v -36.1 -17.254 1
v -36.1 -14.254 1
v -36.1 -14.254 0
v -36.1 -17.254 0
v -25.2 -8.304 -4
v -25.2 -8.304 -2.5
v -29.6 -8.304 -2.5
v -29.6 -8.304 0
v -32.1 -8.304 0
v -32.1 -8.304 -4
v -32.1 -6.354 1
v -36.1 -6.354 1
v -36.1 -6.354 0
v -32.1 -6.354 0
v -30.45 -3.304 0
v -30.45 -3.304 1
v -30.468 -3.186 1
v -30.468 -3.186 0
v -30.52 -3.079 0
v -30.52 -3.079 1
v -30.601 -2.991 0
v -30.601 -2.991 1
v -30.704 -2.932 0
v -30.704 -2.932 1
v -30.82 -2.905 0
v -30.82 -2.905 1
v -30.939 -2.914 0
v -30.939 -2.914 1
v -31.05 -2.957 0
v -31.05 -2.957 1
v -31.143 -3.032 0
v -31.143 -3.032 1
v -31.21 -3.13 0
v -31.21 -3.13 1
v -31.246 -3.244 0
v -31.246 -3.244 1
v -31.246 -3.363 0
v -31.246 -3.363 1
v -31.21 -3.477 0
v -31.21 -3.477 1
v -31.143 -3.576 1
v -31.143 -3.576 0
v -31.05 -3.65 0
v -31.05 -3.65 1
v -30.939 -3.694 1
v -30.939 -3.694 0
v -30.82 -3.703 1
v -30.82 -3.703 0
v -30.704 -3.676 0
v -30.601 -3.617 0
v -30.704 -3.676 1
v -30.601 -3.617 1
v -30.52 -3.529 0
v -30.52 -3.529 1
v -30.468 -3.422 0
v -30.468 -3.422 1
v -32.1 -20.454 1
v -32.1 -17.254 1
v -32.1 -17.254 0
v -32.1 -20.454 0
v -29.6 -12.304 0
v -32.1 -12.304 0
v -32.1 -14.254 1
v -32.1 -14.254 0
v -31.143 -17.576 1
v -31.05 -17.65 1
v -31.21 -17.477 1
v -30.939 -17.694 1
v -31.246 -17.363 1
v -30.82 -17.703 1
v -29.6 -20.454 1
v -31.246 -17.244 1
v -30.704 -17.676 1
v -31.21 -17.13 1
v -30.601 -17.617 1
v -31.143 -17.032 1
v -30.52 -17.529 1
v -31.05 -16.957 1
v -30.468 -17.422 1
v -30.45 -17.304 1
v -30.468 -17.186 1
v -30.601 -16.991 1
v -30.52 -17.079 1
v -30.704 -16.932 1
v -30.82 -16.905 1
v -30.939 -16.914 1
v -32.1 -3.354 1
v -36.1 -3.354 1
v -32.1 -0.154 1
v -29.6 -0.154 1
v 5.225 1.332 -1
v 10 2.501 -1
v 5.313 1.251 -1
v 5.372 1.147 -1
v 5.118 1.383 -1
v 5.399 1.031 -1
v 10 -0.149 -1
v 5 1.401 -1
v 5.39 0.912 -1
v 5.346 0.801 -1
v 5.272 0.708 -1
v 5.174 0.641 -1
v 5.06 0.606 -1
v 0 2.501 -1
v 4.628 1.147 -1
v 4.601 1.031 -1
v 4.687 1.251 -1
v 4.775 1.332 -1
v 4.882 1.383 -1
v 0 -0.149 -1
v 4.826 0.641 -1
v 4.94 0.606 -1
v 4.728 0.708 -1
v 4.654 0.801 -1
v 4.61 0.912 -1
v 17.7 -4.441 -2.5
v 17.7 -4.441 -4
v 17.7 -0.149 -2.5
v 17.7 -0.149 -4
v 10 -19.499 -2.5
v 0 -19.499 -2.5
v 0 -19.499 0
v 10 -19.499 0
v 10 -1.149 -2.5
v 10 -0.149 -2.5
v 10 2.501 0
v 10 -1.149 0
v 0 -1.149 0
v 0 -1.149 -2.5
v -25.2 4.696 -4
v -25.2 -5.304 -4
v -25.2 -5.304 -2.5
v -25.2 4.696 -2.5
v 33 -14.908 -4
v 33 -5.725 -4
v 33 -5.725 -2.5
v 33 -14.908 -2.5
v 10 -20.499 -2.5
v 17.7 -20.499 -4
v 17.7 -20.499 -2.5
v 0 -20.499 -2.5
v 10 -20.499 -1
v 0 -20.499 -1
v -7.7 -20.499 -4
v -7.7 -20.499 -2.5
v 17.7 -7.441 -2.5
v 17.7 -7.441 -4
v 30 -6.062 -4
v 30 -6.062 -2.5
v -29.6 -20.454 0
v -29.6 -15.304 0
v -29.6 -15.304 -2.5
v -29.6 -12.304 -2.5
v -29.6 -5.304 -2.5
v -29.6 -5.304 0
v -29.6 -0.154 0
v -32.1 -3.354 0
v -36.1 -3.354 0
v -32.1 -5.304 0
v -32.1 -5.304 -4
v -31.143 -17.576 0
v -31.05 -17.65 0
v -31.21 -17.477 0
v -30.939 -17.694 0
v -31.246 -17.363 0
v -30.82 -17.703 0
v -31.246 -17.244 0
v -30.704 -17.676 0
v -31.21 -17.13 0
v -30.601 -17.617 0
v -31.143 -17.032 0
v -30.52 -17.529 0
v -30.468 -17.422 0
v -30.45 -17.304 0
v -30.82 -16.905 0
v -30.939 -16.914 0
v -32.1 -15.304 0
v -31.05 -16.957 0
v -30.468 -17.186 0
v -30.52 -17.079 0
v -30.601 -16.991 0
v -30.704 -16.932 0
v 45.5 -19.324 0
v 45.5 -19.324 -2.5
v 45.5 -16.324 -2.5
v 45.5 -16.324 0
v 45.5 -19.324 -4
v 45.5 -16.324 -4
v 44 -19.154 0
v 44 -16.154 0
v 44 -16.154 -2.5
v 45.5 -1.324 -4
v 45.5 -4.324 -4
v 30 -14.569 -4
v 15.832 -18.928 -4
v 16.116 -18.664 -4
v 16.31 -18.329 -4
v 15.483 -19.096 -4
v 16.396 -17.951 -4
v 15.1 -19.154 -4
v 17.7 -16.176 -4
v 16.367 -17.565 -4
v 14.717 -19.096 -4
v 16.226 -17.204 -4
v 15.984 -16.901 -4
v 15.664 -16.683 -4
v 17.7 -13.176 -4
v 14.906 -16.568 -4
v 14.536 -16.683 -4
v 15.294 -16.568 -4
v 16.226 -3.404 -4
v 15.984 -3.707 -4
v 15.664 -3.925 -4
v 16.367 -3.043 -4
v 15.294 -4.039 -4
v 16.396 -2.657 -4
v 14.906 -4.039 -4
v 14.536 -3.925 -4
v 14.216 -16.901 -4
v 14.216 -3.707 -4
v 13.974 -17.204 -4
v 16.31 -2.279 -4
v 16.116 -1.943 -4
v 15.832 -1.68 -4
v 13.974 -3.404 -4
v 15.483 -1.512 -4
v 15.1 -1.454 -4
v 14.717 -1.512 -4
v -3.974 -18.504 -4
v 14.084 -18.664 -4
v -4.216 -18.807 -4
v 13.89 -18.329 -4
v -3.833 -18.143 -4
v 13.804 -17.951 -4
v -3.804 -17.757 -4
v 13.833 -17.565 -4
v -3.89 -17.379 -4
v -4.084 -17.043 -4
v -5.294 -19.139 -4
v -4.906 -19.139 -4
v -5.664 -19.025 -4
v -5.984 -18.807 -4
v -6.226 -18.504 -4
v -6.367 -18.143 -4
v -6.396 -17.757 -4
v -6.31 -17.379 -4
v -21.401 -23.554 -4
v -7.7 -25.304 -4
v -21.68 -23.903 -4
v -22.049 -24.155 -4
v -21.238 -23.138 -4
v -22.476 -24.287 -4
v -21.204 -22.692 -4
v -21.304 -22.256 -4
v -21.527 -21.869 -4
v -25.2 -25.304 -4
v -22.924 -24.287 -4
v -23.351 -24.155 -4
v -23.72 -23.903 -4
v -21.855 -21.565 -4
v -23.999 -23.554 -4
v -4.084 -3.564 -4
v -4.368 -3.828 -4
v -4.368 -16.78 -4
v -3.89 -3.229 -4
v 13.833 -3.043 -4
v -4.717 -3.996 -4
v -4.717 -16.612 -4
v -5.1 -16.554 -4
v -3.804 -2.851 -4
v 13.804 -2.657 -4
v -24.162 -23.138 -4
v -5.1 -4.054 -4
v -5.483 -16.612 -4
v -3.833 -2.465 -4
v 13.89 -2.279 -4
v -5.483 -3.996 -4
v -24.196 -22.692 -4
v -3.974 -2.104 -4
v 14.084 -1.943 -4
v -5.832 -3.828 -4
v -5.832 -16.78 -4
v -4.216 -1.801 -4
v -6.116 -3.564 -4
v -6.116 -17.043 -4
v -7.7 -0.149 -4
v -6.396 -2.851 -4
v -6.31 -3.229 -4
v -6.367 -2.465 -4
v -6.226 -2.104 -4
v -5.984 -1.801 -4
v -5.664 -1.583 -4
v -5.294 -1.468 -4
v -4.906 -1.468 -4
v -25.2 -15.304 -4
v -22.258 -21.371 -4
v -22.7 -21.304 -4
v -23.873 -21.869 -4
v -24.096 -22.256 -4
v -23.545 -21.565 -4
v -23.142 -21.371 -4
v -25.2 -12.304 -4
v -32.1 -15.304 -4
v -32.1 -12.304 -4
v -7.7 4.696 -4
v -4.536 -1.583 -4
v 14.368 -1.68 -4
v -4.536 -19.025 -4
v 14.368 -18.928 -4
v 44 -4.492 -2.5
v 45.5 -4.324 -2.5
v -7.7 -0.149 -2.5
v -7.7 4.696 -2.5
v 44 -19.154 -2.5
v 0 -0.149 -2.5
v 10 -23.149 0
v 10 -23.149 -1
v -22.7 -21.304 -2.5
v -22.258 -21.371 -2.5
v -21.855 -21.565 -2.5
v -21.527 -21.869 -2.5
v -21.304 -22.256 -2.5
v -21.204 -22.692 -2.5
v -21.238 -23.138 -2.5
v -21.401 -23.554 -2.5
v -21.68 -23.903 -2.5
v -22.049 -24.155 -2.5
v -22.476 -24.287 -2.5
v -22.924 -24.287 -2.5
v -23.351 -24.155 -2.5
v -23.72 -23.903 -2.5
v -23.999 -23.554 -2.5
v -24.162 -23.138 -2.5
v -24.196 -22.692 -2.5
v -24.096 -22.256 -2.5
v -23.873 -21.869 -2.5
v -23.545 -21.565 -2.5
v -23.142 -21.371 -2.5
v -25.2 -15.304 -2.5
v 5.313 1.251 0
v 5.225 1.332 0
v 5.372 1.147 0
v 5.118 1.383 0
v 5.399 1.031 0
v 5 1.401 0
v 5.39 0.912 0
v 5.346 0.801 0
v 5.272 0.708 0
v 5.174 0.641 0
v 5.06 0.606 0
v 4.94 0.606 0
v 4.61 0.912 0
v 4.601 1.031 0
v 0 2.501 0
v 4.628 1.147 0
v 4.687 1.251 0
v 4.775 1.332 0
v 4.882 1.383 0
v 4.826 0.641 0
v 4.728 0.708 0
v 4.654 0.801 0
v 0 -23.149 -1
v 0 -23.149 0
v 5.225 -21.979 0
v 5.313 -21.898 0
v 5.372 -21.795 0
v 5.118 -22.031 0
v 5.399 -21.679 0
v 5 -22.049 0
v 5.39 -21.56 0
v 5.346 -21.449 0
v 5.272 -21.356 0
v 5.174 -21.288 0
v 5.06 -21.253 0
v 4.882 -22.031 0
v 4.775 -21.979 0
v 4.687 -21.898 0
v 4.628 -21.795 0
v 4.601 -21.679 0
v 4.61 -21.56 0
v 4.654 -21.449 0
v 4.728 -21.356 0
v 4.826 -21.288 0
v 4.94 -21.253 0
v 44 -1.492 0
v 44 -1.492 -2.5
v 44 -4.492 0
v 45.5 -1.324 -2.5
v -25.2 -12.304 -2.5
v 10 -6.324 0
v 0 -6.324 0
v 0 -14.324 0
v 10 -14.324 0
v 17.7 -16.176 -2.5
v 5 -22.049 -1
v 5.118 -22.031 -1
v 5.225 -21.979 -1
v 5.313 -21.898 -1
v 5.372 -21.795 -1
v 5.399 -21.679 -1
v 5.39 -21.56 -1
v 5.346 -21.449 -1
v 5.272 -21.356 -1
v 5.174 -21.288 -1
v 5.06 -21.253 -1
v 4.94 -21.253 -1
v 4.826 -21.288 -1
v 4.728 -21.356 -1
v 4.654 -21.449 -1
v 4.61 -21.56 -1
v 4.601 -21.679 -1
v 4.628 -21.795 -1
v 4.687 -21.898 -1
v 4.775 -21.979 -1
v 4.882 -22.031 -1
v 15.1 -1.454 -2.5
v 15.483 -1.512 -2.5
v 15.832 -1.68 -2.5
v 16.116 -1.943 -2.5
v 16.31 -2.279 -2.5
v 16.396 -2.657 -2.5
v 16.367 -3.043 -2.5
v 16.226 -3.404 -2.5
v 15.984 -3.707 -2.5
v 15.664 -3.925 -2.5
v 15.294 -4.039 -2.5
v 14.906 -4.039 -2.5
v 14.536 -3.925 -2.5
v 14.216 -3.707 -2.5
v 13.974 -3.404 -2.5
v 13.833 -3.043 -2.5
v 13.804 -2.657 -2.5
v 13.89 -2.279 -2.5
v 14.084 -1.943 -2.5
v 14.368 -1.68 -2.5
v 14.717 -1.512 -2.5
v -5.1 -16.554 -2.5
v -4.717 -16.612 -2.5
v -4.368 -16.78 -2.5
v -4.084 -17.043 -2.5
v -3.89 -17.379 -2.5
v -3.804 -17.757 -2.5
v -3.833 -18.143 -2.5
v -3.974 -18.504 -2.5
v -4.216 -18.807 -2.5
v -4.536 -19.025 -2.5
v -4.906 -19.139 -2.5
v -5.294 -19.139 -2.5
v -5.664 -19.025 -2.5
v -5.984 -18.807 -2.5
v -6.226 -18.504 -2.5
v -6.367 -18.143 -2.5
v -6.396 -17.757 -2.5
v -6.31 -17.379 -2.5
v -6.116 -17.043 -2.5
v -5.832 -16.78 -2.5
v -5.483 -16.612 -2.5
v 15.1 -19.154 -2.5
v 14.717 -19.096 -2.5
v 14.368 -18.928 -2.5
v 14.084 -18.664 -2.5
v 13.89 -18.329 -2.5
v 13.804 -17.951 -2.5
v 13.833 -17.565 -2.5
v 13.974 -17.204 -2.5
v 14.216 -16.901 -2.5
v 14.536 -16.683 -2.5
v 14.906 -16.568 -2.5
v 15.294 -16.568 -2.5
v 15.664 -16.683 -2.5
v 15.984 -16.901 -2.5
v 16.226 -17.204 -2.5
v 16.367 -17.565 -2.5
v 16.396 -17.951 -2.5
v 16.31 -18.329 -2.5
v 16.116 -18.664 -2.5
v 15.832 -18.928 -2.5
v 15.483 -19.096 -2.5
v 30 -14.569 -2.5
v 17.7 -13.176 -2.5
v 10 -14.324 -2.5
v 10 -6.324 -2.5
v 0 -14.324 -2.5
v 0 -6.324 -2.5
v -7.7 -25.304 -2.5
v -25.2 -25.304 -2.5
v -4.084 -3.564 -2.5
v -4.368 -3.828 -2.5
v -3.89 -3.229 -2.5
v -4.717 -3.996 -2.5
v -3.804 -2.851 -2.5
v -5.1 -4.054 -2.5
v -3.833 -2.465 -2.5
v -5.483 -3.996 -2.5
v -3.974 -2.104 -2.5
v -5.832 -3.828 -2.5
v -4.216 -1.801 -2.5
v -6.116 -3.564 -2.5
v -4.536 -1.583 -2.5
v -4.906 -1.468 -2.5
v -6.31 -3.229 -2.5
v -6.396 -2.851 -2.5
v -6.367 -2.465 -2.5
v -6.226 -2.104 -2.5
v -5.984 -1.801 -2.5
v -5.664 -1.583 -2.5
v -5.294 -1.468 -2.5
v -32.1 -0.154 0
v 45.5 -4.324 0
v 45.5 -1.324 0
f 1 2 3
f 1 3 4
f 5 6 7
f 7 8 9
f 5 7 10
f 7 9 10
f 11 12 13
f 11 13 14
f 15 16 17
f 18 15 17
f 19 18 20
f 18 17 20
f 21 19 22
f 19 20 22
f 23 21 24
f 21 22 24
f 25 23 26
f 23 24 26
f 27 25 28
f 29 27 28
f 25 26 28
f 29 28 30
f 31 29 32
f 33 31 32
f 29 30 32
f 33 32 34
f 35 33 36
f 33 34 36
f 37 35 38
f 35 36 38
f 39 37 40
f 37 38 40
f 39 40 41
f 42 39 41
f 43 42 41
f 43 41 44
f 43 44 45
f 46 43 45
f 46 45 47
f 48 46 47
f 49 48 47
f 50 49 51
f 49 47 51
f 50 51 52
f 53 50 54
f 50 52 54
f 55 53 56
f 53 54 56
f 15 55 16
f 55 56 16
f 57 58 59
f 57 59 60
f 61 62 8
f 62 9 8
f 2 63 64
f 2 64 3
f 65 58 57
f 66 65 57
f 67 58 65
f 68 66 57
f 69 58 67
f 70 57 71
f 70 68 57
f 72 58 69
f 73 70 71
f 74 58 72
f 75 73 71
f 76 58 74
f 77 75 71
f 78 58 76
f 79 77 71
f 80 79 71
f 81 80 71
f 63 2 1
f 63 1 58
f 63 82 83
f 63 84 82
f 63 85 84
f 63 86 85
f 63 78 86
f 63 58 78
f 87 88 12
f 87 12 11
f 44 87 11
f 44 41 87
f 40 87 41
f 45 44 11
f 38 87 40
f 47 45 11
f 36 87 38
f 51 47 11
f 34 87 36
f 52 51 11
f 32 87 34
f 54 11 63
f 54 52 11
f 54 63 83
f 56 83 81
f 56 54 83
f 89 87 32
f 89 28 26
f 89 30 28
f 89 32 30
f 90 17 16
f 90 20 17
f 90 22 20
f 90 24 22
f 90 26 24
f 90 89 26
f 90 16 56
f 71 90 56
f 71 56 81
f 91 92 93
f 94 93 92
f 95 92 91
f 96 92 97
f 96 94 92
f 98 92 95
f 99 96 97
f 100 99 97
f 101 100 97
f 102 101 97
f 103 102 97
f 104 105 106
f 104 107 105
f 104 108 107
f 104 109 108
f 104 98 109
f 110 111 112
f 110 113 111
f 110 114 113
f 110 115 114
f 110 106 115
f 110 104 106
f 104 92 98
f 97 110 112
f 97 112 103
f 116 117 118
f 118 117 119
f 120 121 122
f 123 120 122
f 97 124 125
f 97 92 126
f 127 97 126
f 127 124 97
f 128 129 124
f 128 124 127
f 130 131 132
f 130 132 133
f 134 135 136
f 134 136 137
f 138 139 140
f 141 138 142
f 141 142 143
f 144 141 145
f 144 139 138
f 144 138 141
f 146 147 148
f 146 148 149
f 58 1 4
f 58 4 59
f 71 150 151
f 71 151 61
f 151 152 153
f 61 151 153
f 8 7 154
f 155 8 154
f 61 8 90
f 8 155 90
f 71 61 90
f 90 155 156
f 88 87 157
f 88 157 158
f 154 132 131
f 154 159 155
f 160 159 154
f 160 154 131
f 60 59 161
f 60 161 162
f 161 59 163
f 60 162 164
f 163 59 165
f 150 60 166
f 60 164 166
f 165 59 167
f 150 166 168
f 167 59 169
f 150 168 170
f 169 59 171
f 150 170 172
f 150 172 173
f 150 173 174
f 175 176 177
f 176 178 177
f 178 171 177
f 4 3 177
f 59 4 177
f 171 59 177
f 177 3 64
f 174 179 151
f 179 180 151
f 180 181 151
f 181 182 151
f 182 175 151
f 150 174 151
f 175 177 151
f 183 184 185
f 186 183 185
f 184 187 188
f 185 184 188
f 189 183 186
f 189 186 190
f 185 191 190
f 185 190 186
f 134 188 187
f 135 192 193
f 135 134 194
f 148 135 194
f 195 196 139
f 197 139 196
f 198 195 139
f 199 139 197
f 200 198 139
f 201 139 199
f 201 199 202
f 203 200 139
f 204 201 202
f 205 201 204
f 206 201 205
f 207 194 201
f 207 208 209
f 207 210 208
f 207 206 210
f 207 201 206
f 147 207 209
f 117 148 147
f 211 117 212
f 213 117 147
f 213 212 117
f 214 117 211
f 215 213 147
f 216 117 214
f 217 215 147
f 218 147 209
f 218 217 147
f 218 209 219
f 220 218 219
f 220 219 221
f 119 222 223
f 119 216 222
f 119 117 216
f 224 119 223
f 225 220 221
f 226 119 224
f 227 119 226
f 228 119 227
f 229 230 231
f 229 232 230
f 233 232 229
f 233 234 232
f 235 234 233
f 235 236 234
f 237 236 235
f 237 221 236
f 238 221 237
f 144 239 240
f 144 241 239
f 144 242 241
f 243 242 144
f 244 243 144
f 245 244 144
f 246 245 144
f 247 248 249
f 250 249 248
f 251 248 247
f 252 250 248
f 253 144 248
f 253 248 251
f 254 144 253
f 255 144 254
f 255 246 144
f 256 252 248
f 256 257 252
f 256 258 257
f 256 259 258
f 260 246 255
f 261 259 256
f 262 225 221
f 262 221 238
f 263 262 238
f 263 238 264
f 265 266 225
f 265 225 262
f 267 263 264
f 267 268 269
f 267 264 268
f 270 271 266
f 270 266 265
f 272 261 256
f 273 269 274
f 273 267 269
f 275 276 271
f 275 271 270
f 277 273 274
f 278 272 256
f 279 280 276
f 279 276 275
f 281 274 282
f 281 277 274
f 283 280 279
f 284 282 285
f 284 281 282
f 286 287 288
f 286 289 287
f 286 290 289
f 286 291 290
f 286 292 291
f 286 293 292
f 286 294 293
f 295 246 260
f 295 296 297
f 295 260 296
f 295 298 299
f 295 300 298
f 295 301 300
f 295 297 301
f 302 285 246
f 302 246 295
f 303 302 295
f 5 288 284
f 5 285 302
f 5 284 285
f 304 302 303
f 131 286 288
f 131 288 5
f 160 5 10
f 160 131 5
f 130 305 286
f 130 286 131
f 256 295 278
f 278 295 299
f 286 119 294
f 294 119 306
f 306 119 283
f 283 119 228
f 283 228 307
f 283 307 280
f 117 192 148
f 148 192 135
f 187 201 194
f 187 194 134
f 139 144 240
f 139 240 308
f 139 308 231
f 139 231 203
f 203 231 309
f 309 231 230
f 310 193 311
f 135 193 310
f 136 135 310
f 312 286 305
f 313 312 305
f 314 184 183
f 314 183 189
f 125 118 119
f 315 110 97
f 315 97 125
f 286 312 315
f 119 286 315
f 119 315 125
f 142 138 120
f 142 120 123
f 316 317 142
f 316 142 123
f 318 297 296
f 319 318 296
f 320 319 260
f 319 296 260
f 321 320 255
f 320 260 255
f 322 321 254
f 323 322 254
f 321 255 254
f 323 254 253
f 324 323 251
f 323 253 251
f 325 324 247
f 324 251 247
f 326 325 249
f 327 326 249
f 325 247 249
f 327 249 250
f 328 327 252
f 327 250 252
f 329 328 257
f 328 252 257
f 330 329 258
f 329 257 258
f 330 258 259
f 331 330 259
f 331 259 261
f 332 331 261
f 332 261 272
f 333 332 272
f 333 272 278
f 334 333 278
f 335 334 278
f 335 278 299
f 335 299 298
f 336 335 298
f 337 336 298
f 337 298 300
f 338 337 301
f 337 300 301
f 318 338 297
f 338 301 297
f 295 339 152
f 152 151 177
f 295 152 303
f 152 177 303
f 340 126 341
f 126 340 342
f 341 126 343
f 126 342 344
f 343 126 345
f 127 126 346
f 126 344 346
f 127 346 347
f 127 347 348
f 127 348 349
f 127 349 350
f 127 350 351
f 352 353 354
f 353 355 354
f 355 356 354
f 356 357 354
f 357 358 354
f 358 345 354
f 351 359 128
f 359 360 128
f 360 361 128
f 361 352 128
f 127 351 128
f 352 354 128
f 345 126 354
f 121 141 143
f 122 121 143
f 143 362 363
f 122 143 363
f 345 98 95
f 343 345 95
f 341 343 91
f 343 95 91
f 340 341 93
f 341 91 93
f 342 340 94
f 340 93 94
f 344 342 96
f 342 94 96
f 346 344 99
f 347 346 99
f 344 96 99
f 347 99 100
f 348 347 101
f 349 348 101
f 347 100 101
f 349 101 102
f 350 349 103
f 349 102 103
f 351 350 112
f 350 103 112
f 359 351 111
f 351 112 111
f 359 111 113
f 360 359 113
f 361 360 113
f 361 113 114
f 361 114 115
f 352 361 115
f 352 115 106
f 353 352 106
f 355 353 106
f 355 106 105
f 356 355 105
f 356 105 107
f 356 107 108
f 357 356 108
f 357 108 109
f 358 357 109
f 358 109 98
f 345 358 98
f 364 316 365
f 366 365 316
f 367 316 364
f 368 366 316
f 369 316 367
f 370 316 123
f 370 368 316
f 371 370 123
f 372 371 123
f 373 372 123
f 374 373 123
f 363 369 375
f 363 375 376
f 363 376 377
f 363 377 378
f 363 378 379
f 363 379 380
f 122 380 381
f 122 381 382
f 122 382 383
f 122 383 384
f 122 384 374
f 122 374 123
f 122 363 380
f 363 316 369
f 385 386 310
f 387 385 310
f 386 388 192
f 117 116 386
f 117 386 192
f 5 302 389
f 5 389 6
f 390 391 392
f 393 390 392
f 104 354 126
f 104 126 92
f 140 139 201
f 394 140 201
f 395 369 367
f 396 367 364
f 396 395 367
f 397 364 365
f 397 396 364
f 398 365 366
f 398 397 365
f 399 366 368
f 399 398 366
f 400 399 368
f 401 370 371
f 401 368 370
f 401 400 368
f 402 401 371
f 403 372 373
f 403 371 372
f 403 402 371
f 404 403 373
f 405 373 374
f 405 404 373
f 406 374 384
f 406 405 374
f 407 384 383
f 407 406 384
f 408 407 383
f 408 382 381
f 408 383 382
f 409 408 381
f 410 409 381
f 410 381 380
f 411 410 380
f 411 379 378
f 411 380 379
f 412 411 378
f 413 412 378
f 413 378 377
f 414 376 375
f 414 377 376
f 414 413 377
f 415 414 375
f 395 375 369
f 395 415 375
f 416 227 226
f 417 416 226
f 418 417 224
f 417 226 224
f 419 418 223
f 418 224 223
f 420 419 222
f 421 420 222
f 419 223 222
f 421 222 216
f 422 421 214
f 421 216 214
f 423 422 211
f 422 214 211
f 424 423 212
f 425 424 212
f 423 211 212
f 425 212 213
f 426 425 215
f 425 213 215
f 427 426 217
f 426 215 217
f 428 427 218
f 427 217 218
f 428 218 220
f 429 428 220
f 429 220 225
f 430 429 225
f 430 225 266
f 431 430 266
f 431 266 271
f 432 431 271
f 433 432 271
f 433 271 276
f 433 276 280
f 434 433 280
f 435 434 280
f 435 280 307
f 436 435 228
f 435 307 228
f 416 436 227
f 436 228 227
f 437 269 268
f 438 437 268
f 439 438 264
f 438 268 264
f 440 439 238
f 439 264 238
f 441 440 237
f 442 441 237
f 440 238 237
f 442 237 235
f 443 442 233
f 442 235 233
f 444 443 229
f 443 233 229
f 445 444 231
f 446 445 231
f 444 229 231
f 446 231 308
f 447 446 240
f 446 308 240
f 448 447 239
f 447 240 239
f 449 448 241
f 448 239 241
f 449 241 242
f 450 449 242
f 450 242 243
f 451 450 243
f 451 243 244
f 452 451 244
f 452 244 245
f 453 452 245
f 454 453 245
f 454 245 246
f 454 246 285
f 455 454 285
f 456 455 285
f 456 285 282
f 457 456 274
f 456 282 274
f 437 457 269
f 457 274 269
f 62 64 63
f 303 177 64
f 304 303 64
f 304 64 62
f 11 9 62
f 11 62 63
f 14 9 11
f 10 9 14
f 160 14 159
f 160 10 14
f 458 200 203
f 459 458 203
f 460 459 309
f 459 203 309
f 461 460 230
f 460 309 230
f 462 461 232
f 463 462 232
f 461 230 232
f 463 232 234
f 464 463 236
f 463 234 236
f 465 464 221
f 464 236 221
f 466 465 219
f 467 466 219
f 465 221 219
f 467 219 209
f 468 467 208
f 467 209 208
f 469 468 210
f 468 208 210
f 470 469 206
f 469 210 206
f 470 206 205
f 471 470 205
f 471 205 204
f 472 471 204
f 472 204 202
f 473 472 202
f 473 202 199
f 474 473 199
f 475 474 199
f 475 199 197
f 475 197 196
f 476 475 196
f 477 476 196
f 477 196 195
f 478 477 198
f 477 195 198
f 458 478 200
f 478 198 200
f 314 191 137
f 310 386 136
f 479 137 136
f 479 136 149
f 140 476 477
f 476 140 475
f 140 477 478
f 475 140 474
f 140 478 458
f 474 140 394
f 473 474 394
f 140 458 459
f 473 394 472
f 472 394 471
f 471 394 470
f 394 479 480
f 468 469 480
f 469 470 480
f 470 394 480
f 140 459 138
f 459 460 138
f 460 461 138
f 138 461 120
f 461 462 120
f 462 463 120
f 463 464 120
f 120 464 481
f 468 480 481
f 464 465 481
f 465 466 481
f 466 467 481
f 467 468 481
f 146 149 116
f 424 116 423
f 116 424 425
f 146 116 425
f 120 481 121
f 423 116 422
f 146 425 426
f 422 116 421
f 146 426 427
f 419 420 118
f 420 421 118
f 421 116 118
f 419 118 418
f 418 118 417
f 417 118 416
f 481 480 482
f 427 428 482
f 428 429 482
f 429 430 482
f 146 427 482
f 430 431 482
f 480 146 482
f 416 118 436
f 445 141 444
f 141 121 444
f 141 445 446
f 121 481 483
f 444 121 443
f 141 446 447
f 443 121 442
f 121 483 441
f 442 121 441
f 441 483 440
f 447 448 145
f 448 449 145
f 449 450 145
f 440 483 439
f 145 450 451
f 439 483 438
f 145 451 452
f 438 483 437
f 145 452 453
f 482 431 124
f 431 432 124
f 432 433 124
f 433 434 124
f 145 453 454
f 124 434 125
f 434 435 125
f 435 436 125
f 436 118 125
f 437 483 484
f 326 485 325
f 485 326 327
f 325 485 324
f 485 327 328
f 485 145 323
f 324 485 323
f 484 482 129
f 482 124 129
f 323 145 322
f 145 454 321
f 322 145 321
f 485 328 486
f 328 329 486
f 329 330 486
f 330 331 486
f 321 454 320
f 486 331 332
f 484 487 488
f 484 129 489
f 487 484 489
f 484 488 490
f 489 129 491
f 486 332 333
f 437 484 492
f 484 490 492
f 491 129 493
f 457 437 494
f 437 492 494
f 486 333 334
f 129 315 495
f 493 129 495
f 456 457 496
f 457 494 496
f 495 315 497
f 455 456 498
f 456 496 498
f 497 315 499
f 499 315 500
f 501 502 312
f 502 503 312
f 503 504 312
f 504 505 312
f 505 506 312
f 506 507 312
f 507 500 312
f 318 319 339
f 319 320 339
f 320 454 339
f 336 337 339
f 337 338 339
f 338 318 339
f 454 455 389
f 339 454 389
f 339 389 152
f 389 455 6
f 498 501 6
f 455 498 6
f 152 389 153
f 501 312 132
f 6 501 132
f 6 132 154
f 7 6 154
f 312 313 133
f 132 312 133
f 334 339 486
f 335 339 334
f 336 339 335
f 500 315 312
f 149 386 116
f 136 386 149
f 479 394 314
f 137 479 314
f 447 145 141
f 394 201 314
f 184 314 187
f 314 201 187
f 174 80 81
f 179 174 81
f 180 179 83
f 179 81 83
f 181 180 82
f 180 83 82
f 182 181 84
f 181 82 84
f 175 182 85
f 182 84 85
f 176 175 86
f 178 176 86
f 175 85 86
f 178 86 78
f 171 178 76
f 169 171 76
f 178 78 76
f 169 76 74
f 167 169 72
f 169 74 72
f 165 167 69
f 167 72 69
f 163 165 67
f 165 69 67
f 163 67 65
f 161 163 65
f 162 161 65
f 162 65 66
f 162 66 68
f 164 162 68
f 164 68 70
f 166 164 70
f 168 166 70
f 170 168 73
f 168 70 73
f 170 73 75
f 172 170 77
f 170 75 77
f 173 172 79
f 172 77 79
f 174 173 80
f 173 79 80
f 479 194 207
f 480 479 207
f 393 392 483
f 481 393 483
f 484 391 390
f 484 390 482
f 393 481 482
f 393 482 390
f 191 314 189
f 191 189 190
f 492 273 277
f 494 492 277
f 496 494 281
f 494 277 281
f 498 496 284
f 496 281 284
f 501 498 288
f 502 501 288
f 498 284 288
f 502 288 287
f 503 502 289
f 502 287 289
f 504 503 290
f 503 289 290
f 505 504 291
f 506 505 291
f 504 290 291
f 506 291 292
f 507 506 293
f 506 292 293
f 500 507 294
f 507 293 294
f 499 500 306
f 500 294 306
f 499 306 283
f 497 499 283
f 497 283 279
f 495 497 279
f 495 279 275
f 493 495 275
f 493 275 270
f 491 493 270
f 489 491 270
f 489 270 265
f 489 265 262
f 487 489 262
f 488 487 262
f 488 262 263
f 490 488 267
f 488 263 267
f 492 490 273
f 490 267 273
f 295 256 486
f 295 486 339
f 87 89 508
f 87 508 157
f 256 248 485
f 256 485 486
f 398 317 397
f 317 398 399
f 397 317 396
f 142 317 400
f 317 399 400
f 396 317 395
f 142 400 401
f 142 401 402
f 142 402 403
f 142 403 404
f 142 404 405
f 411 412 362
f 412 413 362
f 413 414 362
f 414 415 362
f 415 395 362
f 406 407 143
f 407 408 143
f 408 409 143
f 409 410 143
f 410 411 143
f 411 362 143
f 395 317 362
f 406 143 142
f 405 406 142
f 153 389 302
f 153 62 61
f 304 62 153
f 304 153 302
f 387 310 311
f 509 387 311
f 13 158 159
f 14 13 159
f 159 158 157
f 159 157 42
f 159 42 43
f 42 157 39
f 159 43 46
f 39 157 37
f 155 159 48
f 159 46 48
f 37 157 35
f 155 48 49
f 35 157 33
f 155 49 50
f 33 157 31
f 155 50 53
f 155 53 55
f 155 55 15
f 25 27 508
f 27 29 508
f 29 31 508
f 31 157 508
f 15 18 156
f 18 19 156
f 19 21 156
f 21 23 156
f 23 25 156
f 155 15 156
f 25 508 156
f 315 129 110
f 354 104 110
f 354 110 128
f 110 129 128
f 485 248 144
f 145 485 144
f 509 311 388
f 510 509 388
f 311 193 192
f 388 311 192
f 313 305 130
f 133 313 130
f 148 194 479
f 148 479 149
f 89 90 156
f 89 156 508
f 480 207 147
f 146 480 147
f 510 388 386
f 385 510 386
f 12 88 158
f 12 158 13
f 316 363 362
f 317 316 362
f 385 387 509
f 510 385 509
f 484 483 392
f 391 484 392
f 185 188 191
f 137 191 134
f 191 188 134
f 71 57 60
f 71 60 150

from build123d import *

# Parameters (mm, degrees)
EXTRUDE_1_DEPTH     = 10
SKETCH_2_R          = 0.4
CUT_EXTRUDE_1_DEPTH = 15.682716688
SKETCH_3_R          = 0.4
EXTRUDE_2_DEPTH     = 1
EXTRUDE_3_REACH     = 45.175
SKETCH_4_W          = 2.5
SKETCH_4_H          = 3
EXTRUDE_4_REACH     = 48.044
SKETCH_5_W          = 1.5
SKETCH_5_H          = 3
LOFT_START          = -4
LOFT_2_DEPTH        = 1.5
EXTRUDE_7_DEPTH     = 4
EXTRUDE_8_DEPTH     = 1.5
SKETCH_13_W         = 25.4
SKETCH_13_H         = 20.35
SKETCH_13_R         = 1.3
EXTRUDE_9_DEPTH     = 1.5
SKETCH_14_W         = 17.5
SKETCH_14_H         = 30
SKETCH_14_R         = 1.5
EXTRUDE_10_DEPTH    = 1.5


# Read off the part's stored shape, not the designer's step: По сечениям2
with BuildPart() as part:
    # Эскиз1 → Бобышка-Вытянуть1 (new body)
    with BuildSketch(Plane(origin=(0, 0, 0), x_dir=(0, 0, -1), z_dir=(1, 0, 0))):
        Polygon((0, 0), (0, 2.50113593), (1, 2.50113593), (1, -0.14886407), (4, -0.14886407), (4, -10.32386407), (0, -10.32386407), (0, -6.32386407), (2.5, -6.32386407), (2.5, -1.14886407), (0, -1.14886407), align=None)
    extrude_1 = extrude(amount=EXTRUDE_1_DEPTH)

    # Эскиз2 → Вырез-Вытянуть1 (cut, through all)
    with BuildSketch(Plane(origin=(0, 0, -1), x_dir=(-1, 0, 0), z_dir=(0, 0, -1))):
        with Locations(Location((-5, 1.00113593, 0), (0, 0, 90))):
            Circle(SKETCH_2_R)
    cut_extrude_1 = extrude(amount=-CUT_EXTRUDE_1_DEPTH, mode=Mode.SUBTRACT)

    # Зеркальное отражение1: Бобышка-Вытянуть1, Вырез-Вытянуть1 across plane
    add(extrude_1.mirror(Plane(origin=(10, -10.32386407, -4), x_dir=(0, 0, 1), z_dir=(0, 1, 0))))
    add(cut_extrude_1.mirror(Plane(origin=(10, -10.32386407, -4), x_dir=(0, 0, 1), z_dir=(0, 1, 0))), mode=Mode.SUBTRACT)

    # Эскиз5 → Бобышка-Вытянуть4 (add, up to next)
    with BuildSketch(Plane(origin=(-29.6, 0, 0), x_dir=(0, 0, -1), z_dir=(1, 0, 0)), mode=Mode.PRIVATE) as extrude_4_sk1:
        with Locations((3.25, -6.80386407)):
            Rectangle(SKETCH_5_W, SKETCH_5_H)
    extrude_4_tool1 = extrude(extrude_4_sk1.sketch, amount=EXTRUDE_4_REACH, mode=Mode.PRIVATE) - part.part
    # Эскиз5 → Бобышка-Вытянуть4 (add, up to next)
    with BuildSketch(Plane(origin=(-29.6, 0, 0), x_dir=(0, 0, -1), z_dir=(1, 0, 0)), mode=Mode.PRIVATE) as extrude_4_sk2:
        with Locations((3.25, -13.80386407)):
            Rectangle(SKETCH_5_W, SKETCH_5_H)
    extrude_4_tool2 = extrude(extrude_4_sk2.sketch, amount=EXTRUDE_4_REACH, mode=Mode.PRIVATE) - part.part


with BuildPart() as body_2:
    # Эскиз3 → Бобышка-Вытянуть2 (new body)
    with BuildSketch(Plane.XY.offset(1)):
        Polygon((-32.1, -0.15386407), (-32.1, -3.35386407), (-36.1, -3.35386407), (-36.1, -6.35386407), (-32.1, -6.35386407), (-32.1, -14.25386407), (-36.1, -14.25386407), (-36.1, -17.25386407), (-32.1, -17.25386407), (-32.1, -20.45386407), (-29.6, -20.45386407), (-29.6, -0.15386407), align=None)
        with Locations((-30.85, -3.30386407)):
            Circle(SKETCH_3_R, mode=Mode.SUBTRACT)
        with Locations((-30.85, -17.30386407)):
            Circle(SKETCH_3_R, mode=Mode.SUBTRACT)
    extrude(amount=-EXTRUDE_2_DEPTH)

    # Эскиз4 → Бобышка-Вытянуть3 (add, up to next)
    with BuildSketch(Plane(origin=(0, 0, -4), x_dir=(-1, 0, 0), z_dir=(0, 0, -1)), mode=Mode.PRIVATE) as extrude_3_sk1:
        with Locations((30.85, -6.80386407)):
            Rectangle(SKETCH_4_W, SKETCH_4_H)
    extrude_3_tool1 = extrude(extrude_3_sk1.sketch, amount=-EXTRUDE_3_REACH, mode=Mode.PRIVATE) - body_2.part
    # Эскиз4 → Бобышка-Вытянуть3 (add, up to next)
    with BuildSketch(Plane(origin=(0, 0, -4), x_dir=(-1, 0, 0), z_dir=(0, 0, -1)), mode=Mode.PRIVATE) as extrude_3_sk2:
        with Locations((30.85, -13.80386407)):
            Rectangle(SKETCH_4_W, SKETCH_4_H)
    extrude_3_tool2 = extrude(extrude_3_sk2.sketch, amount=-EXTRUDE_3_REACH, mode=Mode.PRIVATE) - body_2.part
    add(extrude_3_tool1.solids().sort_by_distance((-30.85, -6.803864, -4))[0])
    add(extrude_3_tool2.solids().sort_by_distance((-30.85, -13.803864, -4))[0])


with BuildPart() as part_1:
    add(part.part)

    add(body_2.part)  # Бобышка-Вытянуть4 merges body 2
    add(extrude_4_tool1.solids().sort_by_distance((-29.6, -6.803864, -3.25))[0])
    add(extrude_4_tool2.solids().sort_by_distance((-29.6, -13.803864, -3.25))[0])

    # Эскиз8 → По сечениям1 section 0
    with BuildSketch(Plane(origin=(45.5, 0, 0), x_dir=(0, 0, -1), z_dir=(1, 0, 0))):
        with BuildLine():
            Line((2.5, -1.32386407), (4, -1.32386407))
            Line((4, -1.32386407), (4, -4.32386407))
            Line((4, -4.32386407), (2.5, -4.32386407))
            Line((2.5, -4.32386407), (2.5, -1.32386407))
        make_face()
    # Эскиз7 → По сечениям1 section 1
    with BuildSketch(Plane(origin=(10, 0, 0), x_dir=(0, 0, -1), z_dir=(1, 0, 0))):
        with BuildLine():
            Line((2.5, -5.30386407), (4, -5.30386407))
            Line((4, -5.30386407), (4, -8.30386407))
            Line((4, -8.30386407), (2.5, -8.30386407))
            Line((2.5, -8.30386407), (2.5, -5.30386407))
        make_face()
    loft()

    # По сечениям2 outline → По сечениям2 (add)
    with BuildSketch(Plane.XY.offset(LOFT_START)):
        Polygon((10, -15.30386407), (45.5, -19.32386407), (45.5, -16.32386407), (10, -12.30386407), align=None)
    extrude(amount=LOFT_2_DEPTH)

    # Эскиз11 → Бобышка-Вытянуть7 (add)
    with BuildSketch(Plane(origin=(0, 0, -4), x_dir=(-1, 0, 0), z_dir=(0, 0, -1))):
        Polygon((-45.5, -1.32386407), (-44, -1.492033084), (-44, -4.492033084), (-45.5, -4.32386407), align=None)
        Polygon((-45.5, -16.32386407), (-45.5, -19.32386407), (-44, -19.154004915), (-44, -16.154004915), align=None)
    extrude(amount=-EXTRUDE_7_DEPTH)

    # Эскиз12 → Бобышка-Вытянуть8 (add)
    with BuildSketch(Plane(origin=(0, 0, -4), x_dir=(-1, 0, 0), z_dir=(0, 0, -1))):
        Polygon((-30, -6.061610549), (-33, -5.725272521), (-33, -14.908371112), (-30, -14.568652803), align=None)
    extrude(amount=-EXTRUDE_8_DEPTH)

    # Эскиз13 → Бобышка-Вытянуть9 (add)
    with BuildSketch(Plane(origin=(0, 0, -4), x_dir=(-1, 0, 0), z_dir=(0, 0, -1))):
        with Locations((-5, -10.32386407)):
            Rectangle(SKETCH_13_W, SKETCH_13_H)
        with Locations(Location((-15.1, -2.75386407, 0), (0, 0, 90))):
            Circle(SKETCH_13_R, mode=Mode.SUBTRACT)
        with Locations(Location((5.1, -2.75386407, 0), (0, 0, 270))):
            Circle(SKETCH_13_R, mode=Mode.SUBTRACT)
        with Locations(Location((5.1, -17.85386407, 0), (0, 0, 90))):
            Circle(SKETCH_13_R, mode=Mode.SUBTRACT)
        with Locations(Location((-15.1, -17.85386407, 0), (0, 0, 270))):
            Circle(SKETCH_13_R, mode=Mode.SUBTRACT)
    extrude(amount=-EXTRUDE_9_DEPTH)

    # Эскиз14 → Бобышка-Вытянуть10 (add)
    with BuildSketch(Plane(origin=(0, 0, -4), x_dir=(-1, 0, 0), z_dir=(0, 0, -1))):
        with Locations((16.45, -10.30386407)):
            Rectangle(SKETCH_14_W, SKETCH_14_H)
        with Locations(Location((22.7, -22.80386407, 0), (0, 0, 90))):
            Circle(SKETCH_14_R, mode=Mode.SUBTRACT)
    extrude(amount=-EXTRUDE_10_DEPTH)


solid = part_1.part
